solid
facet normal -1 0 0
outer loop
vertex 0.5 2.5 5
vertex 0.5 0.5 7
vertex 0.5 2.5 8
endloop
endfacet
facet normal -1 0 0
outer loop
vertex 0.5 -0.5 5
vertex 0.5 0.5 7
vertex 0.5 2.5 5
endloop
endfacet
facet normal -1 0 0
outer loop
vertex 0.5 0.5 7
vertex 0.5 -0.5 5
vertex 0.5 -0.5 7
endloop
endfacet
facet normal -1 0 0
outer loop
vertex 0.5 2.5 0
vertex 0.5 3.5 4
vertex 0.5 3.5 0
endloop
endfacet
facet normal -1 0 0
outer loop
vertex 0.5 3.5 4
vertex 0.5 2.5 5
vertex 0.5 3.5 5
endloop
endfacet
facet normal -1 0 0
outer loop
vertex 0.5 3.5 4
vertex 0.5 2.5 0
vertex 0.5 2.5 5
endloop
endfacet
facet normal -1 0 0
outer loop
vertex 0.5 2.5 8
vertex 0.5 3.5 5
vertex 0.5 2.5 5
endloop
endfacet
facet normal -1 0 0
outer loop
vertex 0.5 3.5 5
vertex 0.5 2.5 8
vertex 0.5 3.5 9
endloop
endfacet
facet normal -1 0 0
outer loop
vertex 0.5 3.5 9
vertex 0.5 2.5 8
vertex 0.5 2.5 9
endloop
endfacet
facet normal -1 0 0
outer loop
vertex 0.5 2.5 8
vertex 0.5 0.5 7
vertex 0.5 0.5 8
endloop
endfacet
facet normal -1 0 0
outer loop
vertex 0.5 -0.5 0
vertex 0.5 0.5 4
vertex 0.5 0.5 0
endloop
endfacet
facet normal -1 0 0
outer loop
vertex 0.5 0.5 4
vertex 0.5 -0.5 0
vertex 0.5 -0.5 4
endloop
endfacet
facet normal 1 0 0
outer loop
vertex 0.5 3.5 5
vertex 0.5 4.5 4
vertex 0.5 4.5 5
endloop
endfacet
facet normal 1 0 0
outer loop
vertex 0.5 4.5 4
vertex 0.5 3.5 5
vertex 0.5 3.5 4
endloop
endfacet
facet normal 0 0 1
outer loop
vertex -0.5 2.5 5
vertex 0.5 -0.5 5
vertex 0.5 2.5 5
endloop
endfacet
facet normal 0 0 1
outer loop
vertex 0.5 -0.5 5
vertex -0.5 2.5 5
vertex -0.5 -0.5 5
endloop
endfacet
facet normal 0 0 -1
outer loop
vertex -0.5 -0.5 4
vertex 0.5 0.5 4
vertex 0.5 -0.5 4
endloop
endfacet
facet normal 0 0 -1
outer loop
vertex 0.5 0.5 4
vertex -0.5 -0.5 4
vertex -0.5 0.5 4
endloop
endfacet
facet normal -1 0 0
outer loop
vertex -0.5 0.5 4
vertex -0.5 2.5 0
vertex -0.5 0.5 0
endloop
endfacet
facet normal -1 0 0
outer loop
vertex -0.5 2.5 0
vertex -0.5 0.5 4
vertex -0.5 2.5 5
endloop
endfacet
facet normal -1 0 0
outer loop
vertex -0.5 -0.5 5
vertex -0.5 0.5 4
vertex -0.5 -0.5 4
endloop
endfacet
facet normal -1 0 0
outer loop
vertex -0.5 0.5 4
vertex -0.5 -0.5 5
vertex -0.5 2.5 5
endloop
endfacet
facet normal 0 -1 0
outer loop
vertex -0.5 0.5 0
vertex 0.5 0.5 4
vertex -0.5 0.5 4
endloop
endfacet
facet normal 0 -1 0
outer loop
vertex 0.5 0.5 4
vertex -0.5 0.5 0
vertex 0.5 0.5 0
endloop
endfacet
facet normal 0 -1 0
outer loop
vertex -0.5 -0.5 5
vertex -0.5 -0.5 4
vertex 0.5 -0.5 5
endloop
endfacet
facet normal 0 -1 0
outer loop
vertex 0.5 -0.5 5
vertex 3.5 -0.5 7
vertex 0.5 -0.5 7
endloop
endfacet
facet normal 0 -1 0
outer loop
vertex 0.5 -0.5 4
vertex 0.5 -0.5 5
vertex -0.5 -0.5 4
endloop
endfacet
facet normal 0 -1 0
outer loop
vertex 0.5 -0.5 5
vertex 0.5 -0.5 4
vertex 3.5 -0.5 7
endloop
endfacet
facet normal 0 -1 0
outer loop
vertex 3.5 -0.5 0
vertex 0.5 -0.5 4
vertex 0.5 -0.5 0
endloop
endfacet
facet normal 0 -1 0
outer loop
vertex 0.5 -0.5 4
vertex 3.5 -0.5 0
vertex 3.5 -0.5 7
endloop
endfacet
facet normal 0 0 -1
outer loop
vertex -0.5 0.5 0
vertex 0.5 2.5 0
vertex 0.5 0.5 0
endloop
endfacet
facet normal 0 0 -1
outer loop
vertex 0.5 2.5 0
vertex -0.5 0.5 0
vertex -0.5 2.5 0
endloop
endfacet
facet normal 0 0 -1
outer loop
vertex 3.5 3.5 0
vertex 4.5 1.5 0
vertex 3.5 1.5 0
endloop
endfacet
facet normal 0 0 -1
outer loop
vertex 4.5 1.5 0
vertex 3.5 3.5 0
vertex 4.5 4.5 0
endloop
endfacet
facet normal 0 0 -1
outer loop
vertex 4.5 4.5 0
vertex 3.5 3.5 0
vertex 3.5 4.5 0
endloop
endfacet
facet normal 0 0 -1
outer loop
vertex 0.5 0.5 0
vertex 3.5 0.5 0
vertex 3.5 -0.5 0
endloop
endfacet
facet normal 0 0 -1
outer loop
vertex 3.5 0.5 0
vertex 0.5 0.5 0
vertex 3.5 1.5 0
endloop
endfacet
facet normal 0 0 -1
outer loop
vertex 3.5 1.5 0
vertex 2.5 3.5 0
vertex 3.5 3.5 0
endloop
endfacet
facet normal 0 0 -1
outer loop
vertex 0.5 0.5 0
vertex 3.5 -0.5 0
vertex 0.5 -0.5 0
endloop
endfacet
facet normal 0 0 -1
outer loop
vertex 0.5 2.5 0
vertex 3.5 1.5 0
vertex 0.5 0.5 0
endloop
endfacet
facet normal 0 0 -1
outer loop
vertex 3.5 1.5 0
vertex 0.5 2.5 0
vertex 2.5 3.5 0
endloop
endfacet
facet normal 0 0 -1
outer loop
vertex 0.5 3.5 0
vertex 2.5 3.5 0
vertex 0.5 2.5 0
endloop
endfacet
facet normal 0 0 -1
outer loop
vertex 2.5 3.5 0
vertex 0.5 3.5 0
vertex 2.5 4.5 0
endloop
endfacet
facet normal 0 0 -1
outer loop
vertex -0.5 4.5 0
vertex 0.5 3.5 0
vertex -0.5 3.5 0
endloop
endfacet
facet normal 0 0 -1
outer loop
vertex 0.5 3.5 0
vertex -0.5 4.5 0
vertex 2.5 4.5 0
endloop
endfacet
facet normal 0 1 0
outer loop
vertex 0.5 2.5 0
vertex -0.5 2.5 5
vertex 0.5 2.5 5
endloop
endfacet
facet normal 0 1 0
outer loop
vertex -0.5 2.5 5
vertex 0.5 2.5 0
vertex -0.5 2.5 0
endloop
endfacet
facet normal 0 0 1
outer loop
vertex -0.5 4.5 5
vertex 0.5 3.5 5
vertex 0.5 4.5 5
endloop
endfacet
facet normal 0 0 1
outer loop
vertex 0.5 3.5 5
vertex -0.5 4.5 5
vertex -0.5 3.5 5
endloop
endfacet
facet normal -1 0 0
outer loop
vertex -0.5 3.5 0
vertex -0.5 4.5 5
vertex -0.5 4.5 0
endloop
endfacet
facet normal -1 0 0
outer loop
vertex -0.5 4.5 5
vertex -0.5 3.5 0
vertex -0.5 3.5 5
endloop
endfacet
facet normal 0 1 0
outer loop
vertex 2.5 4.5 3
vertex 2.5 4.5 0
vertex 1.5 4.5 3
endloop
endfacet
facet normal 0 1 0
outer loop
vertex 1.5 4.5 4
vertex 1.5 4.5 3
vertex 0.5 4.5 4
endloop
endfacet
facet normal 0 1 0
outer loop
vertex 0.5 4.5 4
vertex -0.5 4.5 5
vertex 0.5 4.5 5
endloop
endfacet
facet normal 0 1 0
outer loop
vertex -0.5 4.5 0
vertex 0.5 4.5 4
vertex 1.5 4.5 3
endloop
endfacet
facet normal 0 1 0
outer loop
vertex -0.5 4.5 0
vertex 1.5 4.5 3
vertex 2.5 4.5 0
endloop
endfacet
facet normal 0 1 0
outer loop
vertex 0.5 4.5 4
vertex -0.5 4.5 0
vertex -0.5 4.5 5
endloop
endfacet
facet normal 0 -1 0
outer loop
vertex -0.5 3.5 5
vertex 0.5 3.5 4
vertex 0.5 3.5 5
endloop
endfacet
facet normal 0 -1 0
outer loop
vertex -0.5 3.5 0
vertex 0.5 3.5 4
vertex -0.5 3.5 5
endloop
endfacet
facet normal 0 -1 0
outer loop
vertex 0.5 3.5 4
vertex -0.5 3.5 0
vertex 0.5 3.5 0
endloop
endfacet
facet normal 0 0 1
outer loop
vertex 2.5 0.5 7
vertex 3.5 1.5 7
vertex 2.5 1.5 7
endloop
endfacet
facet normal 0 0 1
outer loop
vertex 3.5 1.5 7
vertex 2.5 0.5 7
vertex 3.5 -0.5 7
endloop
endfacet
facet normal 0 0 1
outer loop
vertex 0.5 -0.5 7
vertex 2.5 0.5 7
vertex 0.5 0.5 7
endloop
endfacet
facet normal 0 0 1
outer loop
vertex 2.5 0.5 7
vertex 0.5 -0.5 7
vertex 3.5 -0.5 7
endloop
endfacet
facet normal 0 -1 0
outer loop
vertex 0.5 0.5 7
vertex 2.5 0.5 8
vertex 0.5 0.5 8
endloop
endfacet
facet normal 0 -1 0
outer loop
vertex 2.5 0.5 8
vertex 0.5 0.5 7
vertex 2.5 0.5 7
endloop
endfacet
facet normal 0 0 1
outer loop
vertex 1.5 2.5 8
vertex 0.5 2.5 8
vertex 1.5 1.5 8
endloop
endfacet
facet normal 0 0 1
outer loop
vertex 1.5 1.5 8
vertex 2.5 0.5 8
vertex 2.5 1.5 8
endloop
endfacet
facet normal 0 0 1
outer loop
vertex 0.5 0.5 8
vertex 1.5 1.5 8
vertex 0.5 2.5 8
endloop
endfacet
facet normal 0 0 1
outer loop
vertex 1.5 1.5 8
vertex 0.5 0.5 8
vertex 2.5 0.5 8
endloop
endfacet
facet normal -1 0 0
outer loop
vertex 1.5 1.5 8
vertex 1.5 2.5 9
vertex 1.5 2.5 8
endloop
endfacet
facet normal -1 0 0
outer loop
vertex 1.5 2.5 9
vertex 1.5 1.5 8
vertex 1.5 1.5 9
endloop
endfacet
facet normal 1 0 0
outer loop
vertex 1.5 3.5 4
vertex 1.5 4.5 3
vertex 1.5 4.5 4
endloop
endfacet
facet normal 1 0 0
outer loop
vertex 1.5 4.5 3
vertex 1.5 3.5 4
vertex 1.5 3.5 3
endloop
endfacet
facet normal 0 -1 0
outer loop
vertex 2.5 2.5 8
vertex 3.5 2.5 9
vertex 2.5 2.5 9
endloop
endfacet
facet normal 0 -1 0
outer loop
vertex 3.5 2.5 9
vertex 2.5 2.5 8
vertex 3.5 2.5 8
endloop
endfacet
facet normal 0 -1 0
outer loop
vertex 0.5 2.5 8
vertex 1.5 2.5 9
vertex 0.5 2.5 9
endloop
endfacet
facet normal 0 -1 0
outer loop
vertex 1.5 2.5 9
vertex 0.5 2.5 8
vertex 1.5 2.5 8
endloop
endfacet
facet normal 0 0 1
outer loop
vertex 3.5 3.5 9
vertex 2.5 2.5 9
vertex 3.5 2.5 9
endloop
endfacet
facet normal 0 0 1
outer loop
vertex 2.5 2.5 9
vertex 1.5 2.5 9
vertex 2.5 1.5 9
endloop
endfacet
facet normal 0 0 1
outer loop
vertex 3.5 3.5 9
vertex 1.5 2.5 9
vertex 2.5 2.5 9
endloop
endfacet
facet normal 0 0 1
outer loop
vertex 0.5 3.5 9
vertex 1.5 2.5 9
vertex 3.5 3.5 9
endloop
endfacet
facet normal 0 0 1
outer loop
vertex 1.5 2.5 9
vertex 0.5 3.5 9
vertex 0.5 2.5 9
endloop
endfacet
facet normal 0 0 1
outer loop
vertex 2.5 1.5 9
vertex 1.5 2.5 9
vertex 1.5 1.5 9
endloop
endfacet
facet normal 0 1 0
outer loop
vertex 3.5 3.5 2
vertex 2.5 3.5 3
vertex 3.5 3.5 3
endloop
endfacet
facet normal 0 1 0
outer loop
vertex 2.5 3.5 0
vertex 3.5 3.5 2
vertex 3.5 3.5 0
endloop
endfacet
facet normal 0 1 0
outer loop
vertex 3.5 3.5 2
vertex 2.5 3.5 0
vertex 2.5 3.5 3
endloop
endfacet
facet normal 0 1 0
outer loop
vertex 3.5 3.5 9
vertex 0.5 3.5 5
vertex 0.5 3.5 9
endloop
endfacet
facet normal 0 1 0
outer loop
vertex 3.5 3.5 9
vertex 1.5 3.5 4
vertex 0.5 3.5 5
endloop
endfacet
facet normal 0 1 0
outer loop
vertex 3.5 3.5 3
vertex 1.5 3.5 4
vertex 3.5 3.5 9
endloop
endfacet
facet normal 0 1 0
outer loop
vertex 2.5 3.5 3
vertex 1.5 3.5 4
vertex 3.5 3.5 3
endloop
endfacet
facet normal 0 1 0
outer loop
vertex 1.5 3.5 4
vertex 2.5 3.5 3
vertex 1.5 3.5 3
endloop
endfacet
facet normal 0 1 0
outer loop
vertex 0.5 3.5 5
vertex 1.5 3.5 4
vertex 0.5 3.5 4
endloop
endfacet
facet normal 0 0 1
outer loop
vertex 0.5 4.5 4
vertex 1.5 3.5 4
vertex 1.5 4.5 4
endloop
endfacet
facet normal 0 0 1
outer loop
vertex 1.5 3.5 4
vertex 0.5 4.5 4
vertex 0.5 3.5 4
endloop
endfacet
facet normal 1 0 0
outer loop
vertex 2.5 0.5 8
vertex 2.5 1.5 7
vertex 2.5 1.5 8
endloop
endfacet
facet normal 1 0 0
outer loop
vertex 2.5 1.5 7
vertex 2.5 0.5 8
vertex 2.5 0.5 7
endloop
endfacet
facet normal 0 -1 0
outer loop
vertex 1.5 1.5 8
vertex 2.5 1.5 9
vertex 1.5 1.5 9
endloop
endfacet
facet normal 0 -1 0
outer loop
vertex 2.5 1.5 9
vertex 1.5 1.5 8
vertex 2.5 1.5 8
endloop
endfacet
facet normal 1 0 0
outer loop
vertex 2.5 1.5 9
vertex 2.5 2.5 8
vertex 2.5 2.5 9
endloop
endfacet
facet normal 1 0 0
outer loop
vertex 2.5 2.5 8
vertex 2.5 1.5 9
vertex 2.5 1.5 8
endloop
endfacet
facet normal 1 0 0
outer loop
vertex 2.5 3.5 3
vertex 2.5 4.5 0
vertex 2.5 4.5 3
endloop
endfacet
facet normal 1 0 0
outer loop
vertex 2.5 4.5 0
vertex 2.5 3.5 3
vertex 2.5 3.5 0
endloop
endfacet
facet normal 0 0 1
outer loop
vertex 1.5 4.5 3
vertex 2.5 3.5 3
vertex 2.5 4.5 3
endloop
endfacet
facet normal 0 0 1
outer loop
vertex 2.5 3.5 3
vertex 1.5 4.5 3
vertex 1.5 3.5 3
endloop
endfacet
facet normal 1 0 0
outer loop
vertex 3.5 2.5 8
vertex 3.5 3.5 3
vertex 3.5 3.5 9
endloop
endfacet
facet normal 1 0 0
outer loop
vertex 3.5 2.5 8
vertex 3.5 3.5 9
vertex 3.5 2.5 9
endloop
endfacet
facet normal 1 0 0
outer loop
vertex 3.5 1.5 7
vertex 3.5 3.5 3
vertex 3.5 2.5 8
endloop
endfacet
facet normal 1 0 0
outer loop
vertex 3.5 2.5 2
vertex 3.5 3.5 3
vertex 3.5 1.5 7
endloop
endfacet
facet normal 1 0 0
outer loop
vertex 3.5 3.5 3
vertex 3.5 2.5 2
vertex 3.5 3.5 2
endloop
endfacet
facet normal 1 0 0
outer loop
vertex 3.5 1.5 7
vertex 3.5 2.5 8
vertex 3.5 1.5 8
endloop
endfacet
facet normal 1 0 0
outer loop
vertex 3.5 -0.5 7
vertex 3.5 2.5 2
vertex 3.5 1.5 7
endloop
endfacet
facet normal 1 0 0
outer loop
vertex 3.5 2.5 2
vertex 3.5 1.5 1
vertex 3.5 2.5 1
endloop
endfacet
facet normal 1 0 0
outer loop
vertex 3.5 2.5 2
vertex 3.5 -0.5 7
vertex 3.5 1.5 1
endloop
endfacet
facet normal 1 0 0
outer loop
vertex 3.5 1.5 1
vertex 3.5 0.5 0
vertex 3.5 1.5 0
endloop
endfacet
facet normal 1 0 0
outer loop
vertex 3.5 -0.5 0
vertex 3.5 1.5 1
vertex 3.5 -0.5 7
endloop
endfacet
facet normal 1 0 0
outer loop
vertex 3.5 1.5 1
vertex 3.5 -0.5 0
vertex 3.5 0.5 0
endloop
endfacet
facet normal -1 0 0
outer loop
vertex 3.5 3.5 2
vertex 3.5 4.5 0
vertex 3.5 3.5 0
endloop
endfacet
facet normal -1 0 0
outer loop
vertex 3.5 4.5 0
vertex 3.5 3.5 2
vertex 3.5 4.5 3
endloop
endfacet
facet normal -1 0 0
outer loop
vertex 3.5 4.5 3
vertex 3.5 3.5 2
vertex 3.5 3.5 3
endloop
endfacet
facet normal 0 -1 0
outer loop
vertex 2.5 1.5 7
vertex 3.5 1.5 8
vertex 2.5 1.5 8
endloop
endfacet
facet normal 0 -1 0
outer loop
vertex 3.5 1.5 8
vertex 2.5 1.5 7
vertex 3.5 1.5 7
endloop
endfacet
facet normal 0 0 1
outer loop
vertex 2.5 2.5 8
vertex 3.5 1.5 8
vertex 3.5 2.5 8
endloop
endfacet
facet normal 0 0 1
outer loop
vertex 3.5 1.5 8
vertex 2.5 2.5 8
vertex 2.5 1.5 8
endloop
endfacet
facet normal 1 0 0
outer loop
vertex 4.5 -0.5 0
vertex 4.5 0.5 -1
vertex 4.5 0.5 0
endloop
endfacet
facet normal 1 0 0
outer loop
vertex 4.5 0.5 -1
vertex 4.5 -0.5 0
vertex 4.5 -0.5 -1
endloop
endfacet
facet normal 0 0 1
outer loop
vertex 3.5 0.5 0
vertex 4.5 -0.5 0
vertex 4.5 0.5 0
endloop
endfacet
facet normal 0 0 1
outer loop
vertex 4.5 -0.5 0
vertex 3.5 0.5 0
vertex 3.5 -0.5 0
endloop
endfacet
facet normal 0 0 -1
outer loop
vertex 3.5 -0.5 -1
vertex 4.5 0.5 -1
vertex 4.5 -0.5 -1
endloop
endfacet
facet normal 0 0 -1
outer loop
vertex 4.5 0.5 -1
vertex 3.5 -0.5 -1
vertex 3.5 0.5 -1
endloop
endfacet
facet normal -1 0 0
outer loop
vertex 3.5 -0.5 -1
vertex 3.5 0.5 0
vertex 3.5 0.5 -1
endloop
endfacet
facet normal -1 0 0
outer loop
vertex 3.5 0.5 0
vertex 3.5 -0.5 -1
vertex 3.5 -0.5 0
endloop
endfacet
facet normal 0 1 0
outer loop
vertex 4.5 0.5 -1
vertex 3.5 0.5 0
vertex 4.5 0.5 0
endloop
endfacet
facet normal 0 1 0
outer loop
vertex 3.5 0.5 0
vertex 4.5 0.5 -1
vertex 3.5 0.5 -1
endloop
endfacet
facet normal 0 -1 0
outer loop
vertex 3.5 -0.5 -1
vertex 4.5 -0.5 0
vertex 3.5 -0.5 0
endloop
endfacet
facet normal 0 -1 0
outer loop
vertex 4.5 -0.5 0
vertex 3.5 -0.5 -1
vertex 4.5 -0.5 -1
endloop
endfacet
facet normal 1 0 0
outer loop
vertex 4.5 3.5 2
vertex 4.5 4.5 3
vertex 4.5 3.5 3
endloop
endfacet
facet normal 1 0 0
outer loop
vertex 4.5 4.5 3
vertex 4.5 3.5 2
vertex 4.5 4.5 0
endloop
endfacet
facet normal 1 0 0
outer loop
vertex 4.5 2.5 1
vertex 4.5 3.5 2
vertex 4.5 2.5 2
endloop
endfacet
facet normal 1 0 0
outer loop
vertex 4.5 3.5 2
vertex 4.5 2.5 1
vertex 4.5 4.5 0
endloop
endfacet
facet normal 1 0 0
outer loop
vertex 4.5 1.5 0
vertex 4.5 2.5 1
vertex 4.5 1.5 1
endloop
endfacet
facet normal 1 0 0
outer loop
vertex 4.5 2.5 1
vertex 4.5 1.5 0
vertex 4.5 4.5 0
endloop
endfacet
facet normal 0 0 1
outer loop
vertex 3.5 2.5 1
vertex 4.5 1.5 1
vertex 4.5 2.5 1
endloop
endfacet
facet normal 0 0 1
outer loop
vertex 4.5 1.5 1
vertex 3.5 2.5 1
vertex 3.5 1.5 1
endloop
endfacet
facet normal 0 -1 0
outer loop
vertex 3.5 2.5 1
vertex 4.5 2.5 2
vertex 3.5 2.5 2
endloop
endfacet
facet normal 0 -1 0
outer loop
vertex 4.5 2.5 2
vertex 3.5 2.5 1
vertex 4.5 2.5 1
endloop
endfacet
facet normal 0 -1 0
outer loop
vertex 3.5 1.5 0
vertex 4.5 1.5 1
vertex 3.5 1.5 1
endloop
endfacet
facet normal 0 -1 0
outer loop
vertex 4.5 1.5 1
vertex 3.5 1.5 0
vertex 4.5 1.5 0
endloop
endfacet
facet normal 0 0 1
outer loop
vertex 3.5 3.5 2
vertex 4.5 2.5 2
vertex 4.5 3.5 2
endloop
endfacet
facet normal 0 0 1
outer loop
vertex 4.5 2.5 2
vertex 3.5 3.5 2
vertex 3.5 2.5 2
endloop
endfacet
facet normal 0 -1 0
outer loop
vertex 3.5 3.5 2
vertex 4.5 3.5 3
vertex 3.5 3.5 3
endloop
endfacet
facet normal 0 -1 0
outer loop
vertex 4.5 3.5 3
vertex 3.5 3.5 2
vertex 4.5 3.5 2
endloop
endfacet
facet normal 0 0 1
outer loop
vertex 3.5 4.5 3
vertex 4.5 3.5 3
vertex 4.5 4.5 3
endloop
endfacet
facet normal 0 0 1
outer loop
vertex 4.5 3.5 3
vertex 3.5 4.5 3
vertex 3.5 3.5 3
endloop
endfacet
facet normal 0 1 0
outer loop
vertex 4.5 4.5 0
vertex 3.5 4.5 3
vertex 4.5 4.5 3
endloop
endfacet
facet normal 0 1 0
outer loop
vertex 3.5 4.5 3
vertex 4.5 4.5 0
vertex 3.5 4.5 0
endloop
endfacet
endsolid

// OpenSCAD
union() {
    translate([0, 0, 4.5]) color([1, 0, 0]) cube([1, 1, 1], center=true);
    translate([0, 1, 2.5]) cube([1, 1, 5], center=true);
    translate([0, 2, 2.5]) cube([1, 1, 5], center=true);
    translate([0, 4, 2.5]) cube([1, 1, 5], center=true);
    translate([1, 0, 3.5]) cube([1, 1, 7], center=true);
    translate([1, 1, 4.0]) cube([1, 1, 8], center=true);
    translate([1, 2, 4.0]) cube([1, 1, 8], center=true);
    translate([1, 3, 4.5]) cube([1, 1, 9], center=true);
    translate([1, 4, 2.0]) cube([1, 1, 4], center=true);
    translate([2, 0, 3.5]) cube([1, 1, 7], center=true);
    translate([2, 1, 4.0]) cube([1, 1, 8], center=true);
    translate([2, 2, 4.5]) cube([1, 1, 9], center=true);
    translate([2, 3, 4.5]) cube([1, 1, 9], center=true);
    translate([2, 4, 1.5]) cube([1, 1, 3], center=true);
    translate([3, 0, 3.5]) cube([1, 1, 7], center=true);
    translate([3, 1, 3.5]) cube([1, 1, 7], center=true);
    translate([3, 2, 4.0]) cube([1, 1, 8], center=true);
    translate([3, 3, 4.5]) cube([1, 1, 9], center=true);
    translate([4, 0, -0.5]) color([0, 0, 1]) cube([1, 1, 1], center=true);
    translate([4, 2, 0.5]) cube([1, 1, 1], center=true);
    translate([4, 3, 1.0]) cube([1, 1, 2], center=true);
    translate([4, 4, 1.5]) cube([1, 1, 3], center=true);
}
